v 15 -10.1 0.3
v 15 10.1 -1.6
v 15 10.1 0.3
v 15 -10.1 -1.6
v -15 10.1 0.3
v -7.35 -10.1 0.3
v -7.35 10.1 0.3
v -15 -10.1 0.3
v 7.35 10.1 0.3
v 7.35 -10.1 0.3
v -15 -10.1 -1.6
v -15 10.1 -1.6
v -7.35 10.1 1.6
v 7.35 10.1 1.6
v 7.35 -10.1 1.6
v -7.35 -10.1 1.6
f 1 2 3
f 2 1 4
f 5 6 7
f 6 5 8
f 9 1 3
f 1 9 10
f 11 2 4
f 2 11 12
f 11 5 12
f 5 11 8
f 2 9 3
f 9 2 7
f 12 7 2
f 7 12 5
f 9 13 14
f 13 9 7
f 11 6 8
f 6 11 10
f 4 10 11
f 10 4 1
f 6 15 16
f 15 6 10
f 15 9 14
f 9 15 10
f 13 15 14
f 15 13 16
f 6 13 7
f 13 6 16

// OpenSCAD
// file: ../../lib/connector/connector_keystone.scad
// connector_keystone_cat5e(3,0.1);

module connector_keystone_cat5e(depth,clear)
{
   lock_width = 30;

   connector_keystone(lock_width,depth,clear);
}

module connector_keystone(lock_width,depth,clear)
{
    height = 20+2*clear;
    width = 14.5+2*clear;
    depth = depth+2*clear;
    lock_depth = 1.3;
    lock_offset = (lock_width-width)/2;

    //#cube([lock_width,height,depth],center=true);
    translate([-lock_width/2,-height/2,-depth/2])
        cube([lock_width,height,depth-lock_depth]);
    translate([-width/2,-height/2,depth/2-lock_depth])
        cube([width,height,lock_depth]);
}
// main file
include <../../lib/connector/connector_keystone.scad>;

connector_keystone_cat5e(3,0.1);
